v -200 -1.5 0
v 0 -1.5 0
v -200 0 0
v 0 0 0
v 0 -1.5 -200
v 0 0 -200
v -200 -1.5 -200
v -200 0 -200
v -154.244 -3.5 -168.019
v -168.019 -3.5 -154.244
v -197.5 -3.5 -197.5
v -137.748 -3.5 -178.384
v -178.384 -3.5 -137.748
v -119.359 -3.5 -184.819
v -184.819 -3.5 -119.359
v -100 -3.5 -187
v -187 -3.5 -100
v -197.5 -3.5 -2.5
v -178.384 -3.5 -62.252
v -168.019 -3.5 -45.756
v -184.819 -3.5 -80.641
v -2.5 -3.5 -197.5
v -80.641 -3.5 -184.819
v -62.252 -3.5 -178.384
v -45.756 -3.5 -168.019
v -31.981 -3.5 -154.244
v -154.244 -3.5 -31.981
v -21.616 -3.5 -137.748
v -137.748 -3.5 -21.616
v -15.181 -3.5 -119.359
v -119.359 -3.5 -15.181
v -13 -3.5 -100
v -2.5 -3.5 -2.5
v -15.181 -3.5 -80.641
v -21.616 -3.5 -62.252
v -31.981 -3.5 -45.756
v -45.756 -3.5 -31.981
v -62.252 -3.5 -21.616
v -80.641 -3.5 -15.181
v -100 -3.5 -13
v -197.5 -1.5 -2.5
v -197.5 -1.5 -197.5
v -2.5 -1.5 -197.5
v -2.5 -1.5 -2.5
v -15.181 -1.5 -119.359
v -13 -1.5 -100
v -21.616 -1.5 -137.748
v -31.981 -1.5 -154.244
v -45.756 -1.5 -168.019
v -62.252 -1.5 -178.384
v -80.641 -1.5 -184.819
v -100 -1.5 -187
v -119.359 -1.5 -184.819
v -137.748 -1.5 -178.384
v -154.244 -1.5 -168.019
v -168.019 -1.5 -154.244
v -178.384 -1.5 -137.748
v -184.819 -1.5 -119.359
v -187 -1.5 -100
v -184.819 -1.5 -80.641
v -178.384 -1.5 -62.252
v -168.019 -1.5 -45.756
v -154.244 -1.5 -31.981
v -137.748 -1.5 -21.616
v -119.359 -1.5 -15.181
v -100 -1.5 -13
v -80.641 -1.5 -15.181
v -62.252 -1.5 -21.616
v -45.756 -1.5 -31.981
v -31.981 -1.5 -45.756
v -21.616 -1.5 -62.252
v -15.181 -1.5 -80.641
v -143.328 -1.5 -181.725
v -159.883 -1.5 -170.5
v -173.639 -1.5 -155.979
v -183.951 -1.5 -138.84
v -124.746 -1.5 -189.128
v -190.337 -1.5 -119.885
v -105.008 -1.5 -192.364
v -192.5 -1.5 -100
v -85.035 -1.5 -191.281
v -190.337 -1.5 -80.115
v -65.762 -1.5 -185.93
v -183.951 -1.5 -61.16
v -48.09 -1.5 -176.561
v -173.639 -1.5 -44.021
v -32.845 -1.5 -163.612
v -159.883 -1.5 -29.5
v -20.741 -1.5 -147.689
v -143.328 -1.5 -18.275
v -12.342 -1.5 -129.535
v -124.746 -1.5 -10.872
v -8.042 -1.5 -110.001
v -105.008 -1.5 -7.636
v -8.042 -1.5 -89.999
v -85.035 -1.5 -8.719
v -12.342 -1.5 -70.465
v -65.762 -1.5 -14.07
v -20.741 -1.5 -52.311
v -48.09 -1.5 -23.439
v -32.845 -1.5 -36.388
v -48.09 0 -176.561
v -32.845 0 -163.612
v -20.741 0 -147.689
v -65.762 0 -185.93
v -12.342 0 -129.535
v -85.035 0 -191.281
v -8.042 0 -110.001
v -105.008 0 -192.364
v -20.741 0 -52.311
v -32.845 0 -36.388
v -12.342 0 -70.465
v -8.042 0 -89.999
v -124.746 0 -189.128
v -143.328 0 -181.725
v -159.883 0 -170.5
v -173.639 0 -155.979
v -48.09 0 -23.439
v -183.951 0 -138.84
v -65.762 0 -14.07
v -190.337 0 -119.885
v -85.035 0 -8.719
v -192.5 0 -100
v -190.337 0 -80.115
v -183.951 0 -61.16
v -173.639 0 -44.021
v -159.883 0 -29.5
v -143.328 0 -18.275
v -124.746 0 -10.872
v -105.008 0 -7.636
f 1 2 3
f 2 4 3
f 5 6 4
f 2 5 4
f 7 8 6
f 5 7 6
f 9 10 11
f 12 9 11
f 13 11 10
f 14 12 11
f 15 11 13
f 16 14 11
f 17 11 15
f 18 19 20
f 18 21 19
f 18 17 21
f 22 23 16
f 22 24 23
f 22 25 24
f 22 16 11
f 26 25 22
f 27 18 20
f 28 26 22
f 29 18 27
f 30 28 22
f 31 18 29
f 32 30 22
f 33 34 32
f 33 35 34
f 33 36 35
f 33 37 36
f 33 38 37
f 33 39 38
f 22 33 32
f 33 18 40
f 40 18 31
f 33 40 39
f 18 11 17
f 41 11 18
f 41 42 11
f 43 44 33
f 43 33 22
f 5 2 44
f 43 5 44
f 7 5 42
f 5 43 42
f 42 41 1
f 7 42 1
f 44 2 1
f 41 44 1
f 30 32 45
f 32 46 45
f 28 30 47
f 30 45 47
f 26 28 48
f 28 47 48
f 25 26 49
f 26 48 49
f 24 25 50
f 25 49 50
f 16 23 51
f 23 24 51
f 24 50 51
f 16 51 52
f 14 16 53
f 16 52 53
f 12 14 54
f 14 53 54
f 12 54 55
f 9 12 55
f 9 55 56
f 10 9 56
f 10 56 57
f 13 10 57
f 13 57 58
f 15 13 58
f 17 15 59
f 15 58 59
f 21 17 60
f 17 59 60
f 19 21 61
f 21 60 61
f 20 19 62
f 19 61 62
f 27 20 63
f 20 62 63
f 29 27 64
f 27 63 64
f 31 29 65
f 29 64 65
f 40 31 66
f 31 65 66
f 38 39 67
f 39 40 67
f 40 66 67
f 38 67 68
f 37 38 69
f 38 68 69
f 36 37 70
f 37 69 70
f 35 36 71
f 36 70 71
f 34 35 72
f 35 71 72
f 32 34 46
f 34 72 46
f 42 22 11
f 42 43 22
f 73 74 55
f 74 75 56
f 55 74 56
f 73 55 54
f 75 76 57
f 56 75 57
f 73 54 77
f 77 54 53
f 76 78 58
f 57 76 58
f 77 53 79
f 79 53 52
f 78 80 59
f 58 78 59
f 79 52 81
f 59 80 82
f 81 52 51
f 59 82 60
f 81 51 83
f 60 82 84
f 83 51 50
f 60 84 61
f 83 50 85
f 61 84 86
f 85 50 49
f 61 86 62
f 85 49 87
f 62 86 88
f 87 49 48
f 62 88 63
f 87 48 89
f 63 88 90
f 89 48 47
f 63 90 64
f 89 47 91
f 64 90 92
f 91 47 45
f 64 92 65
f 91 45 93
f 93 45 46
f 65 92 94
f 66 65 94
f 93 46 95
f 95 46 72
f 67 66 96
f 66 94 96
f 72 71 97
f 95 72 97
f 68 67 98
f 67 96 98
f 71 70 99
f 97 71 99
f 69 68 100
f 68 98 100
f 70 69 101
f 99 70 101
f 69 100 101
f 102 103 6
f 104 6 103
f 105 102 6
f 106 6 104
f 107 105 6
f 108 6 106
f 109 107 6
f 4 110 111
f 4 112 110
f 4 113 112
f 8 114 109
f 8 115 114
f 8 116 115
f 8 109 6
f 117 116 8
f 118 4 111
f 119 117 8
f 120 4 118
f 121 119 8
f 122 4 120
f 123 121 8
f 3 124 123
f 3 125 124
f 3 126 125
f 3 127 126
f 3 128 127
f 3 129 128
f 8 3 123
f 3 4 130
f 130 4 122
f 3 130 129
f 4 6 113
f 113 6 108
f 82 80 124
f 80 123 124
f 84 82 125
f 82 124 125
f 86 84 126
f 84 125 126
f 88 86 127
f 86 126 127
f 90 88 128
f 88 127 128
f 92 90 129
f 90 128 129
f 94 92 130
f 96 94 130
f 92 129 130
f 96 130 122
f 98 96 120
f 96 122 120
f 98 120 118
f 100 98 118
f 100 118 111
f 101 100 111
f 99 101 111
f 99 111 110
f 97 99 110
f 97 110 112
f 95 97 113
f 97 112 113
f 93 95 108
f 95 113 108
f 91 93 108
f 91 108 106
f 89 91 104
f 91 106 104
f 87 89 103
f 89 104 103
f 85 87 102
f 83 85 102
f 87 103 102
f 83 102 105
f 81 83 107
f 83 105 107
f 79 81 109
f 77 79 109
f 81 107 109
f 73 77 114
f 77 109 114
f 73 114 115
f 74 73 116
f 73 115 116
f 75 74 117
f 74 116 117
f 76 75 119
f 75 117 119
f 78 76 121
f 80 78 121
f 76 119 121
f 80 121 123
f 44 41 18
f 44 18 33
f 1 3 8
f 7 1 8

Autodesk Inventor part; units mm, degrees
ref_plane "YZ Plane" through (0, 0, 0) normal (1, 0, 0) x (0, 1, 0)
ref_plane "XZ Plane" through (0, 0, 0) normal (0, 1, 0) x (-1, 0, 0)
ref_plane "XY Plane" through (0, 0, 0) normal (0, 0, 1) x (1, 0, 0)
sketch "Sketch1" plane through (0, 0, 0) normal (0, 1, 0) x (-1, 0, 0)
  line L0 (0, 0) -> (200, 0)
  line L1 (200, 0) -> (200, -200)
  line L2 (200, -200) -> (0, -200)
  line L3 (0, -200) -> (0, 0)
  circle A0 centre (100, -100) radius 92.5
  dimension "d0" = 200
  dimension "d1" = 200
  dimension "d2" = 185
extrude "Extrusion1" add sketch "Sketch1" against normal blind 1.5
sketch "Sketch3" plane through (0, -1.5, 0) normal (0, -1, 0) x (1, 0, 0)
  line L0 (-197.5, -2.5) -> (-2.5, -2.5)
  line L1 (-2.5, -2.5) -> (-2.5, -197.5)
  line L2 (-2.5, -197.5) -> (-197.5, -197.5)
  line L3 (-197.5, -197.5) -> (-197.5, -2.5)
  circle A0 centre (-100, -100) radius 87
  dimension "d5" = 195
  dimension "d6" = 195
  dimension "d7" = 174
  dimension "d11" = 0
extrude "Extrusion2" add sketch "Sketch3" along normal blind 2
properties part number "box cover"
